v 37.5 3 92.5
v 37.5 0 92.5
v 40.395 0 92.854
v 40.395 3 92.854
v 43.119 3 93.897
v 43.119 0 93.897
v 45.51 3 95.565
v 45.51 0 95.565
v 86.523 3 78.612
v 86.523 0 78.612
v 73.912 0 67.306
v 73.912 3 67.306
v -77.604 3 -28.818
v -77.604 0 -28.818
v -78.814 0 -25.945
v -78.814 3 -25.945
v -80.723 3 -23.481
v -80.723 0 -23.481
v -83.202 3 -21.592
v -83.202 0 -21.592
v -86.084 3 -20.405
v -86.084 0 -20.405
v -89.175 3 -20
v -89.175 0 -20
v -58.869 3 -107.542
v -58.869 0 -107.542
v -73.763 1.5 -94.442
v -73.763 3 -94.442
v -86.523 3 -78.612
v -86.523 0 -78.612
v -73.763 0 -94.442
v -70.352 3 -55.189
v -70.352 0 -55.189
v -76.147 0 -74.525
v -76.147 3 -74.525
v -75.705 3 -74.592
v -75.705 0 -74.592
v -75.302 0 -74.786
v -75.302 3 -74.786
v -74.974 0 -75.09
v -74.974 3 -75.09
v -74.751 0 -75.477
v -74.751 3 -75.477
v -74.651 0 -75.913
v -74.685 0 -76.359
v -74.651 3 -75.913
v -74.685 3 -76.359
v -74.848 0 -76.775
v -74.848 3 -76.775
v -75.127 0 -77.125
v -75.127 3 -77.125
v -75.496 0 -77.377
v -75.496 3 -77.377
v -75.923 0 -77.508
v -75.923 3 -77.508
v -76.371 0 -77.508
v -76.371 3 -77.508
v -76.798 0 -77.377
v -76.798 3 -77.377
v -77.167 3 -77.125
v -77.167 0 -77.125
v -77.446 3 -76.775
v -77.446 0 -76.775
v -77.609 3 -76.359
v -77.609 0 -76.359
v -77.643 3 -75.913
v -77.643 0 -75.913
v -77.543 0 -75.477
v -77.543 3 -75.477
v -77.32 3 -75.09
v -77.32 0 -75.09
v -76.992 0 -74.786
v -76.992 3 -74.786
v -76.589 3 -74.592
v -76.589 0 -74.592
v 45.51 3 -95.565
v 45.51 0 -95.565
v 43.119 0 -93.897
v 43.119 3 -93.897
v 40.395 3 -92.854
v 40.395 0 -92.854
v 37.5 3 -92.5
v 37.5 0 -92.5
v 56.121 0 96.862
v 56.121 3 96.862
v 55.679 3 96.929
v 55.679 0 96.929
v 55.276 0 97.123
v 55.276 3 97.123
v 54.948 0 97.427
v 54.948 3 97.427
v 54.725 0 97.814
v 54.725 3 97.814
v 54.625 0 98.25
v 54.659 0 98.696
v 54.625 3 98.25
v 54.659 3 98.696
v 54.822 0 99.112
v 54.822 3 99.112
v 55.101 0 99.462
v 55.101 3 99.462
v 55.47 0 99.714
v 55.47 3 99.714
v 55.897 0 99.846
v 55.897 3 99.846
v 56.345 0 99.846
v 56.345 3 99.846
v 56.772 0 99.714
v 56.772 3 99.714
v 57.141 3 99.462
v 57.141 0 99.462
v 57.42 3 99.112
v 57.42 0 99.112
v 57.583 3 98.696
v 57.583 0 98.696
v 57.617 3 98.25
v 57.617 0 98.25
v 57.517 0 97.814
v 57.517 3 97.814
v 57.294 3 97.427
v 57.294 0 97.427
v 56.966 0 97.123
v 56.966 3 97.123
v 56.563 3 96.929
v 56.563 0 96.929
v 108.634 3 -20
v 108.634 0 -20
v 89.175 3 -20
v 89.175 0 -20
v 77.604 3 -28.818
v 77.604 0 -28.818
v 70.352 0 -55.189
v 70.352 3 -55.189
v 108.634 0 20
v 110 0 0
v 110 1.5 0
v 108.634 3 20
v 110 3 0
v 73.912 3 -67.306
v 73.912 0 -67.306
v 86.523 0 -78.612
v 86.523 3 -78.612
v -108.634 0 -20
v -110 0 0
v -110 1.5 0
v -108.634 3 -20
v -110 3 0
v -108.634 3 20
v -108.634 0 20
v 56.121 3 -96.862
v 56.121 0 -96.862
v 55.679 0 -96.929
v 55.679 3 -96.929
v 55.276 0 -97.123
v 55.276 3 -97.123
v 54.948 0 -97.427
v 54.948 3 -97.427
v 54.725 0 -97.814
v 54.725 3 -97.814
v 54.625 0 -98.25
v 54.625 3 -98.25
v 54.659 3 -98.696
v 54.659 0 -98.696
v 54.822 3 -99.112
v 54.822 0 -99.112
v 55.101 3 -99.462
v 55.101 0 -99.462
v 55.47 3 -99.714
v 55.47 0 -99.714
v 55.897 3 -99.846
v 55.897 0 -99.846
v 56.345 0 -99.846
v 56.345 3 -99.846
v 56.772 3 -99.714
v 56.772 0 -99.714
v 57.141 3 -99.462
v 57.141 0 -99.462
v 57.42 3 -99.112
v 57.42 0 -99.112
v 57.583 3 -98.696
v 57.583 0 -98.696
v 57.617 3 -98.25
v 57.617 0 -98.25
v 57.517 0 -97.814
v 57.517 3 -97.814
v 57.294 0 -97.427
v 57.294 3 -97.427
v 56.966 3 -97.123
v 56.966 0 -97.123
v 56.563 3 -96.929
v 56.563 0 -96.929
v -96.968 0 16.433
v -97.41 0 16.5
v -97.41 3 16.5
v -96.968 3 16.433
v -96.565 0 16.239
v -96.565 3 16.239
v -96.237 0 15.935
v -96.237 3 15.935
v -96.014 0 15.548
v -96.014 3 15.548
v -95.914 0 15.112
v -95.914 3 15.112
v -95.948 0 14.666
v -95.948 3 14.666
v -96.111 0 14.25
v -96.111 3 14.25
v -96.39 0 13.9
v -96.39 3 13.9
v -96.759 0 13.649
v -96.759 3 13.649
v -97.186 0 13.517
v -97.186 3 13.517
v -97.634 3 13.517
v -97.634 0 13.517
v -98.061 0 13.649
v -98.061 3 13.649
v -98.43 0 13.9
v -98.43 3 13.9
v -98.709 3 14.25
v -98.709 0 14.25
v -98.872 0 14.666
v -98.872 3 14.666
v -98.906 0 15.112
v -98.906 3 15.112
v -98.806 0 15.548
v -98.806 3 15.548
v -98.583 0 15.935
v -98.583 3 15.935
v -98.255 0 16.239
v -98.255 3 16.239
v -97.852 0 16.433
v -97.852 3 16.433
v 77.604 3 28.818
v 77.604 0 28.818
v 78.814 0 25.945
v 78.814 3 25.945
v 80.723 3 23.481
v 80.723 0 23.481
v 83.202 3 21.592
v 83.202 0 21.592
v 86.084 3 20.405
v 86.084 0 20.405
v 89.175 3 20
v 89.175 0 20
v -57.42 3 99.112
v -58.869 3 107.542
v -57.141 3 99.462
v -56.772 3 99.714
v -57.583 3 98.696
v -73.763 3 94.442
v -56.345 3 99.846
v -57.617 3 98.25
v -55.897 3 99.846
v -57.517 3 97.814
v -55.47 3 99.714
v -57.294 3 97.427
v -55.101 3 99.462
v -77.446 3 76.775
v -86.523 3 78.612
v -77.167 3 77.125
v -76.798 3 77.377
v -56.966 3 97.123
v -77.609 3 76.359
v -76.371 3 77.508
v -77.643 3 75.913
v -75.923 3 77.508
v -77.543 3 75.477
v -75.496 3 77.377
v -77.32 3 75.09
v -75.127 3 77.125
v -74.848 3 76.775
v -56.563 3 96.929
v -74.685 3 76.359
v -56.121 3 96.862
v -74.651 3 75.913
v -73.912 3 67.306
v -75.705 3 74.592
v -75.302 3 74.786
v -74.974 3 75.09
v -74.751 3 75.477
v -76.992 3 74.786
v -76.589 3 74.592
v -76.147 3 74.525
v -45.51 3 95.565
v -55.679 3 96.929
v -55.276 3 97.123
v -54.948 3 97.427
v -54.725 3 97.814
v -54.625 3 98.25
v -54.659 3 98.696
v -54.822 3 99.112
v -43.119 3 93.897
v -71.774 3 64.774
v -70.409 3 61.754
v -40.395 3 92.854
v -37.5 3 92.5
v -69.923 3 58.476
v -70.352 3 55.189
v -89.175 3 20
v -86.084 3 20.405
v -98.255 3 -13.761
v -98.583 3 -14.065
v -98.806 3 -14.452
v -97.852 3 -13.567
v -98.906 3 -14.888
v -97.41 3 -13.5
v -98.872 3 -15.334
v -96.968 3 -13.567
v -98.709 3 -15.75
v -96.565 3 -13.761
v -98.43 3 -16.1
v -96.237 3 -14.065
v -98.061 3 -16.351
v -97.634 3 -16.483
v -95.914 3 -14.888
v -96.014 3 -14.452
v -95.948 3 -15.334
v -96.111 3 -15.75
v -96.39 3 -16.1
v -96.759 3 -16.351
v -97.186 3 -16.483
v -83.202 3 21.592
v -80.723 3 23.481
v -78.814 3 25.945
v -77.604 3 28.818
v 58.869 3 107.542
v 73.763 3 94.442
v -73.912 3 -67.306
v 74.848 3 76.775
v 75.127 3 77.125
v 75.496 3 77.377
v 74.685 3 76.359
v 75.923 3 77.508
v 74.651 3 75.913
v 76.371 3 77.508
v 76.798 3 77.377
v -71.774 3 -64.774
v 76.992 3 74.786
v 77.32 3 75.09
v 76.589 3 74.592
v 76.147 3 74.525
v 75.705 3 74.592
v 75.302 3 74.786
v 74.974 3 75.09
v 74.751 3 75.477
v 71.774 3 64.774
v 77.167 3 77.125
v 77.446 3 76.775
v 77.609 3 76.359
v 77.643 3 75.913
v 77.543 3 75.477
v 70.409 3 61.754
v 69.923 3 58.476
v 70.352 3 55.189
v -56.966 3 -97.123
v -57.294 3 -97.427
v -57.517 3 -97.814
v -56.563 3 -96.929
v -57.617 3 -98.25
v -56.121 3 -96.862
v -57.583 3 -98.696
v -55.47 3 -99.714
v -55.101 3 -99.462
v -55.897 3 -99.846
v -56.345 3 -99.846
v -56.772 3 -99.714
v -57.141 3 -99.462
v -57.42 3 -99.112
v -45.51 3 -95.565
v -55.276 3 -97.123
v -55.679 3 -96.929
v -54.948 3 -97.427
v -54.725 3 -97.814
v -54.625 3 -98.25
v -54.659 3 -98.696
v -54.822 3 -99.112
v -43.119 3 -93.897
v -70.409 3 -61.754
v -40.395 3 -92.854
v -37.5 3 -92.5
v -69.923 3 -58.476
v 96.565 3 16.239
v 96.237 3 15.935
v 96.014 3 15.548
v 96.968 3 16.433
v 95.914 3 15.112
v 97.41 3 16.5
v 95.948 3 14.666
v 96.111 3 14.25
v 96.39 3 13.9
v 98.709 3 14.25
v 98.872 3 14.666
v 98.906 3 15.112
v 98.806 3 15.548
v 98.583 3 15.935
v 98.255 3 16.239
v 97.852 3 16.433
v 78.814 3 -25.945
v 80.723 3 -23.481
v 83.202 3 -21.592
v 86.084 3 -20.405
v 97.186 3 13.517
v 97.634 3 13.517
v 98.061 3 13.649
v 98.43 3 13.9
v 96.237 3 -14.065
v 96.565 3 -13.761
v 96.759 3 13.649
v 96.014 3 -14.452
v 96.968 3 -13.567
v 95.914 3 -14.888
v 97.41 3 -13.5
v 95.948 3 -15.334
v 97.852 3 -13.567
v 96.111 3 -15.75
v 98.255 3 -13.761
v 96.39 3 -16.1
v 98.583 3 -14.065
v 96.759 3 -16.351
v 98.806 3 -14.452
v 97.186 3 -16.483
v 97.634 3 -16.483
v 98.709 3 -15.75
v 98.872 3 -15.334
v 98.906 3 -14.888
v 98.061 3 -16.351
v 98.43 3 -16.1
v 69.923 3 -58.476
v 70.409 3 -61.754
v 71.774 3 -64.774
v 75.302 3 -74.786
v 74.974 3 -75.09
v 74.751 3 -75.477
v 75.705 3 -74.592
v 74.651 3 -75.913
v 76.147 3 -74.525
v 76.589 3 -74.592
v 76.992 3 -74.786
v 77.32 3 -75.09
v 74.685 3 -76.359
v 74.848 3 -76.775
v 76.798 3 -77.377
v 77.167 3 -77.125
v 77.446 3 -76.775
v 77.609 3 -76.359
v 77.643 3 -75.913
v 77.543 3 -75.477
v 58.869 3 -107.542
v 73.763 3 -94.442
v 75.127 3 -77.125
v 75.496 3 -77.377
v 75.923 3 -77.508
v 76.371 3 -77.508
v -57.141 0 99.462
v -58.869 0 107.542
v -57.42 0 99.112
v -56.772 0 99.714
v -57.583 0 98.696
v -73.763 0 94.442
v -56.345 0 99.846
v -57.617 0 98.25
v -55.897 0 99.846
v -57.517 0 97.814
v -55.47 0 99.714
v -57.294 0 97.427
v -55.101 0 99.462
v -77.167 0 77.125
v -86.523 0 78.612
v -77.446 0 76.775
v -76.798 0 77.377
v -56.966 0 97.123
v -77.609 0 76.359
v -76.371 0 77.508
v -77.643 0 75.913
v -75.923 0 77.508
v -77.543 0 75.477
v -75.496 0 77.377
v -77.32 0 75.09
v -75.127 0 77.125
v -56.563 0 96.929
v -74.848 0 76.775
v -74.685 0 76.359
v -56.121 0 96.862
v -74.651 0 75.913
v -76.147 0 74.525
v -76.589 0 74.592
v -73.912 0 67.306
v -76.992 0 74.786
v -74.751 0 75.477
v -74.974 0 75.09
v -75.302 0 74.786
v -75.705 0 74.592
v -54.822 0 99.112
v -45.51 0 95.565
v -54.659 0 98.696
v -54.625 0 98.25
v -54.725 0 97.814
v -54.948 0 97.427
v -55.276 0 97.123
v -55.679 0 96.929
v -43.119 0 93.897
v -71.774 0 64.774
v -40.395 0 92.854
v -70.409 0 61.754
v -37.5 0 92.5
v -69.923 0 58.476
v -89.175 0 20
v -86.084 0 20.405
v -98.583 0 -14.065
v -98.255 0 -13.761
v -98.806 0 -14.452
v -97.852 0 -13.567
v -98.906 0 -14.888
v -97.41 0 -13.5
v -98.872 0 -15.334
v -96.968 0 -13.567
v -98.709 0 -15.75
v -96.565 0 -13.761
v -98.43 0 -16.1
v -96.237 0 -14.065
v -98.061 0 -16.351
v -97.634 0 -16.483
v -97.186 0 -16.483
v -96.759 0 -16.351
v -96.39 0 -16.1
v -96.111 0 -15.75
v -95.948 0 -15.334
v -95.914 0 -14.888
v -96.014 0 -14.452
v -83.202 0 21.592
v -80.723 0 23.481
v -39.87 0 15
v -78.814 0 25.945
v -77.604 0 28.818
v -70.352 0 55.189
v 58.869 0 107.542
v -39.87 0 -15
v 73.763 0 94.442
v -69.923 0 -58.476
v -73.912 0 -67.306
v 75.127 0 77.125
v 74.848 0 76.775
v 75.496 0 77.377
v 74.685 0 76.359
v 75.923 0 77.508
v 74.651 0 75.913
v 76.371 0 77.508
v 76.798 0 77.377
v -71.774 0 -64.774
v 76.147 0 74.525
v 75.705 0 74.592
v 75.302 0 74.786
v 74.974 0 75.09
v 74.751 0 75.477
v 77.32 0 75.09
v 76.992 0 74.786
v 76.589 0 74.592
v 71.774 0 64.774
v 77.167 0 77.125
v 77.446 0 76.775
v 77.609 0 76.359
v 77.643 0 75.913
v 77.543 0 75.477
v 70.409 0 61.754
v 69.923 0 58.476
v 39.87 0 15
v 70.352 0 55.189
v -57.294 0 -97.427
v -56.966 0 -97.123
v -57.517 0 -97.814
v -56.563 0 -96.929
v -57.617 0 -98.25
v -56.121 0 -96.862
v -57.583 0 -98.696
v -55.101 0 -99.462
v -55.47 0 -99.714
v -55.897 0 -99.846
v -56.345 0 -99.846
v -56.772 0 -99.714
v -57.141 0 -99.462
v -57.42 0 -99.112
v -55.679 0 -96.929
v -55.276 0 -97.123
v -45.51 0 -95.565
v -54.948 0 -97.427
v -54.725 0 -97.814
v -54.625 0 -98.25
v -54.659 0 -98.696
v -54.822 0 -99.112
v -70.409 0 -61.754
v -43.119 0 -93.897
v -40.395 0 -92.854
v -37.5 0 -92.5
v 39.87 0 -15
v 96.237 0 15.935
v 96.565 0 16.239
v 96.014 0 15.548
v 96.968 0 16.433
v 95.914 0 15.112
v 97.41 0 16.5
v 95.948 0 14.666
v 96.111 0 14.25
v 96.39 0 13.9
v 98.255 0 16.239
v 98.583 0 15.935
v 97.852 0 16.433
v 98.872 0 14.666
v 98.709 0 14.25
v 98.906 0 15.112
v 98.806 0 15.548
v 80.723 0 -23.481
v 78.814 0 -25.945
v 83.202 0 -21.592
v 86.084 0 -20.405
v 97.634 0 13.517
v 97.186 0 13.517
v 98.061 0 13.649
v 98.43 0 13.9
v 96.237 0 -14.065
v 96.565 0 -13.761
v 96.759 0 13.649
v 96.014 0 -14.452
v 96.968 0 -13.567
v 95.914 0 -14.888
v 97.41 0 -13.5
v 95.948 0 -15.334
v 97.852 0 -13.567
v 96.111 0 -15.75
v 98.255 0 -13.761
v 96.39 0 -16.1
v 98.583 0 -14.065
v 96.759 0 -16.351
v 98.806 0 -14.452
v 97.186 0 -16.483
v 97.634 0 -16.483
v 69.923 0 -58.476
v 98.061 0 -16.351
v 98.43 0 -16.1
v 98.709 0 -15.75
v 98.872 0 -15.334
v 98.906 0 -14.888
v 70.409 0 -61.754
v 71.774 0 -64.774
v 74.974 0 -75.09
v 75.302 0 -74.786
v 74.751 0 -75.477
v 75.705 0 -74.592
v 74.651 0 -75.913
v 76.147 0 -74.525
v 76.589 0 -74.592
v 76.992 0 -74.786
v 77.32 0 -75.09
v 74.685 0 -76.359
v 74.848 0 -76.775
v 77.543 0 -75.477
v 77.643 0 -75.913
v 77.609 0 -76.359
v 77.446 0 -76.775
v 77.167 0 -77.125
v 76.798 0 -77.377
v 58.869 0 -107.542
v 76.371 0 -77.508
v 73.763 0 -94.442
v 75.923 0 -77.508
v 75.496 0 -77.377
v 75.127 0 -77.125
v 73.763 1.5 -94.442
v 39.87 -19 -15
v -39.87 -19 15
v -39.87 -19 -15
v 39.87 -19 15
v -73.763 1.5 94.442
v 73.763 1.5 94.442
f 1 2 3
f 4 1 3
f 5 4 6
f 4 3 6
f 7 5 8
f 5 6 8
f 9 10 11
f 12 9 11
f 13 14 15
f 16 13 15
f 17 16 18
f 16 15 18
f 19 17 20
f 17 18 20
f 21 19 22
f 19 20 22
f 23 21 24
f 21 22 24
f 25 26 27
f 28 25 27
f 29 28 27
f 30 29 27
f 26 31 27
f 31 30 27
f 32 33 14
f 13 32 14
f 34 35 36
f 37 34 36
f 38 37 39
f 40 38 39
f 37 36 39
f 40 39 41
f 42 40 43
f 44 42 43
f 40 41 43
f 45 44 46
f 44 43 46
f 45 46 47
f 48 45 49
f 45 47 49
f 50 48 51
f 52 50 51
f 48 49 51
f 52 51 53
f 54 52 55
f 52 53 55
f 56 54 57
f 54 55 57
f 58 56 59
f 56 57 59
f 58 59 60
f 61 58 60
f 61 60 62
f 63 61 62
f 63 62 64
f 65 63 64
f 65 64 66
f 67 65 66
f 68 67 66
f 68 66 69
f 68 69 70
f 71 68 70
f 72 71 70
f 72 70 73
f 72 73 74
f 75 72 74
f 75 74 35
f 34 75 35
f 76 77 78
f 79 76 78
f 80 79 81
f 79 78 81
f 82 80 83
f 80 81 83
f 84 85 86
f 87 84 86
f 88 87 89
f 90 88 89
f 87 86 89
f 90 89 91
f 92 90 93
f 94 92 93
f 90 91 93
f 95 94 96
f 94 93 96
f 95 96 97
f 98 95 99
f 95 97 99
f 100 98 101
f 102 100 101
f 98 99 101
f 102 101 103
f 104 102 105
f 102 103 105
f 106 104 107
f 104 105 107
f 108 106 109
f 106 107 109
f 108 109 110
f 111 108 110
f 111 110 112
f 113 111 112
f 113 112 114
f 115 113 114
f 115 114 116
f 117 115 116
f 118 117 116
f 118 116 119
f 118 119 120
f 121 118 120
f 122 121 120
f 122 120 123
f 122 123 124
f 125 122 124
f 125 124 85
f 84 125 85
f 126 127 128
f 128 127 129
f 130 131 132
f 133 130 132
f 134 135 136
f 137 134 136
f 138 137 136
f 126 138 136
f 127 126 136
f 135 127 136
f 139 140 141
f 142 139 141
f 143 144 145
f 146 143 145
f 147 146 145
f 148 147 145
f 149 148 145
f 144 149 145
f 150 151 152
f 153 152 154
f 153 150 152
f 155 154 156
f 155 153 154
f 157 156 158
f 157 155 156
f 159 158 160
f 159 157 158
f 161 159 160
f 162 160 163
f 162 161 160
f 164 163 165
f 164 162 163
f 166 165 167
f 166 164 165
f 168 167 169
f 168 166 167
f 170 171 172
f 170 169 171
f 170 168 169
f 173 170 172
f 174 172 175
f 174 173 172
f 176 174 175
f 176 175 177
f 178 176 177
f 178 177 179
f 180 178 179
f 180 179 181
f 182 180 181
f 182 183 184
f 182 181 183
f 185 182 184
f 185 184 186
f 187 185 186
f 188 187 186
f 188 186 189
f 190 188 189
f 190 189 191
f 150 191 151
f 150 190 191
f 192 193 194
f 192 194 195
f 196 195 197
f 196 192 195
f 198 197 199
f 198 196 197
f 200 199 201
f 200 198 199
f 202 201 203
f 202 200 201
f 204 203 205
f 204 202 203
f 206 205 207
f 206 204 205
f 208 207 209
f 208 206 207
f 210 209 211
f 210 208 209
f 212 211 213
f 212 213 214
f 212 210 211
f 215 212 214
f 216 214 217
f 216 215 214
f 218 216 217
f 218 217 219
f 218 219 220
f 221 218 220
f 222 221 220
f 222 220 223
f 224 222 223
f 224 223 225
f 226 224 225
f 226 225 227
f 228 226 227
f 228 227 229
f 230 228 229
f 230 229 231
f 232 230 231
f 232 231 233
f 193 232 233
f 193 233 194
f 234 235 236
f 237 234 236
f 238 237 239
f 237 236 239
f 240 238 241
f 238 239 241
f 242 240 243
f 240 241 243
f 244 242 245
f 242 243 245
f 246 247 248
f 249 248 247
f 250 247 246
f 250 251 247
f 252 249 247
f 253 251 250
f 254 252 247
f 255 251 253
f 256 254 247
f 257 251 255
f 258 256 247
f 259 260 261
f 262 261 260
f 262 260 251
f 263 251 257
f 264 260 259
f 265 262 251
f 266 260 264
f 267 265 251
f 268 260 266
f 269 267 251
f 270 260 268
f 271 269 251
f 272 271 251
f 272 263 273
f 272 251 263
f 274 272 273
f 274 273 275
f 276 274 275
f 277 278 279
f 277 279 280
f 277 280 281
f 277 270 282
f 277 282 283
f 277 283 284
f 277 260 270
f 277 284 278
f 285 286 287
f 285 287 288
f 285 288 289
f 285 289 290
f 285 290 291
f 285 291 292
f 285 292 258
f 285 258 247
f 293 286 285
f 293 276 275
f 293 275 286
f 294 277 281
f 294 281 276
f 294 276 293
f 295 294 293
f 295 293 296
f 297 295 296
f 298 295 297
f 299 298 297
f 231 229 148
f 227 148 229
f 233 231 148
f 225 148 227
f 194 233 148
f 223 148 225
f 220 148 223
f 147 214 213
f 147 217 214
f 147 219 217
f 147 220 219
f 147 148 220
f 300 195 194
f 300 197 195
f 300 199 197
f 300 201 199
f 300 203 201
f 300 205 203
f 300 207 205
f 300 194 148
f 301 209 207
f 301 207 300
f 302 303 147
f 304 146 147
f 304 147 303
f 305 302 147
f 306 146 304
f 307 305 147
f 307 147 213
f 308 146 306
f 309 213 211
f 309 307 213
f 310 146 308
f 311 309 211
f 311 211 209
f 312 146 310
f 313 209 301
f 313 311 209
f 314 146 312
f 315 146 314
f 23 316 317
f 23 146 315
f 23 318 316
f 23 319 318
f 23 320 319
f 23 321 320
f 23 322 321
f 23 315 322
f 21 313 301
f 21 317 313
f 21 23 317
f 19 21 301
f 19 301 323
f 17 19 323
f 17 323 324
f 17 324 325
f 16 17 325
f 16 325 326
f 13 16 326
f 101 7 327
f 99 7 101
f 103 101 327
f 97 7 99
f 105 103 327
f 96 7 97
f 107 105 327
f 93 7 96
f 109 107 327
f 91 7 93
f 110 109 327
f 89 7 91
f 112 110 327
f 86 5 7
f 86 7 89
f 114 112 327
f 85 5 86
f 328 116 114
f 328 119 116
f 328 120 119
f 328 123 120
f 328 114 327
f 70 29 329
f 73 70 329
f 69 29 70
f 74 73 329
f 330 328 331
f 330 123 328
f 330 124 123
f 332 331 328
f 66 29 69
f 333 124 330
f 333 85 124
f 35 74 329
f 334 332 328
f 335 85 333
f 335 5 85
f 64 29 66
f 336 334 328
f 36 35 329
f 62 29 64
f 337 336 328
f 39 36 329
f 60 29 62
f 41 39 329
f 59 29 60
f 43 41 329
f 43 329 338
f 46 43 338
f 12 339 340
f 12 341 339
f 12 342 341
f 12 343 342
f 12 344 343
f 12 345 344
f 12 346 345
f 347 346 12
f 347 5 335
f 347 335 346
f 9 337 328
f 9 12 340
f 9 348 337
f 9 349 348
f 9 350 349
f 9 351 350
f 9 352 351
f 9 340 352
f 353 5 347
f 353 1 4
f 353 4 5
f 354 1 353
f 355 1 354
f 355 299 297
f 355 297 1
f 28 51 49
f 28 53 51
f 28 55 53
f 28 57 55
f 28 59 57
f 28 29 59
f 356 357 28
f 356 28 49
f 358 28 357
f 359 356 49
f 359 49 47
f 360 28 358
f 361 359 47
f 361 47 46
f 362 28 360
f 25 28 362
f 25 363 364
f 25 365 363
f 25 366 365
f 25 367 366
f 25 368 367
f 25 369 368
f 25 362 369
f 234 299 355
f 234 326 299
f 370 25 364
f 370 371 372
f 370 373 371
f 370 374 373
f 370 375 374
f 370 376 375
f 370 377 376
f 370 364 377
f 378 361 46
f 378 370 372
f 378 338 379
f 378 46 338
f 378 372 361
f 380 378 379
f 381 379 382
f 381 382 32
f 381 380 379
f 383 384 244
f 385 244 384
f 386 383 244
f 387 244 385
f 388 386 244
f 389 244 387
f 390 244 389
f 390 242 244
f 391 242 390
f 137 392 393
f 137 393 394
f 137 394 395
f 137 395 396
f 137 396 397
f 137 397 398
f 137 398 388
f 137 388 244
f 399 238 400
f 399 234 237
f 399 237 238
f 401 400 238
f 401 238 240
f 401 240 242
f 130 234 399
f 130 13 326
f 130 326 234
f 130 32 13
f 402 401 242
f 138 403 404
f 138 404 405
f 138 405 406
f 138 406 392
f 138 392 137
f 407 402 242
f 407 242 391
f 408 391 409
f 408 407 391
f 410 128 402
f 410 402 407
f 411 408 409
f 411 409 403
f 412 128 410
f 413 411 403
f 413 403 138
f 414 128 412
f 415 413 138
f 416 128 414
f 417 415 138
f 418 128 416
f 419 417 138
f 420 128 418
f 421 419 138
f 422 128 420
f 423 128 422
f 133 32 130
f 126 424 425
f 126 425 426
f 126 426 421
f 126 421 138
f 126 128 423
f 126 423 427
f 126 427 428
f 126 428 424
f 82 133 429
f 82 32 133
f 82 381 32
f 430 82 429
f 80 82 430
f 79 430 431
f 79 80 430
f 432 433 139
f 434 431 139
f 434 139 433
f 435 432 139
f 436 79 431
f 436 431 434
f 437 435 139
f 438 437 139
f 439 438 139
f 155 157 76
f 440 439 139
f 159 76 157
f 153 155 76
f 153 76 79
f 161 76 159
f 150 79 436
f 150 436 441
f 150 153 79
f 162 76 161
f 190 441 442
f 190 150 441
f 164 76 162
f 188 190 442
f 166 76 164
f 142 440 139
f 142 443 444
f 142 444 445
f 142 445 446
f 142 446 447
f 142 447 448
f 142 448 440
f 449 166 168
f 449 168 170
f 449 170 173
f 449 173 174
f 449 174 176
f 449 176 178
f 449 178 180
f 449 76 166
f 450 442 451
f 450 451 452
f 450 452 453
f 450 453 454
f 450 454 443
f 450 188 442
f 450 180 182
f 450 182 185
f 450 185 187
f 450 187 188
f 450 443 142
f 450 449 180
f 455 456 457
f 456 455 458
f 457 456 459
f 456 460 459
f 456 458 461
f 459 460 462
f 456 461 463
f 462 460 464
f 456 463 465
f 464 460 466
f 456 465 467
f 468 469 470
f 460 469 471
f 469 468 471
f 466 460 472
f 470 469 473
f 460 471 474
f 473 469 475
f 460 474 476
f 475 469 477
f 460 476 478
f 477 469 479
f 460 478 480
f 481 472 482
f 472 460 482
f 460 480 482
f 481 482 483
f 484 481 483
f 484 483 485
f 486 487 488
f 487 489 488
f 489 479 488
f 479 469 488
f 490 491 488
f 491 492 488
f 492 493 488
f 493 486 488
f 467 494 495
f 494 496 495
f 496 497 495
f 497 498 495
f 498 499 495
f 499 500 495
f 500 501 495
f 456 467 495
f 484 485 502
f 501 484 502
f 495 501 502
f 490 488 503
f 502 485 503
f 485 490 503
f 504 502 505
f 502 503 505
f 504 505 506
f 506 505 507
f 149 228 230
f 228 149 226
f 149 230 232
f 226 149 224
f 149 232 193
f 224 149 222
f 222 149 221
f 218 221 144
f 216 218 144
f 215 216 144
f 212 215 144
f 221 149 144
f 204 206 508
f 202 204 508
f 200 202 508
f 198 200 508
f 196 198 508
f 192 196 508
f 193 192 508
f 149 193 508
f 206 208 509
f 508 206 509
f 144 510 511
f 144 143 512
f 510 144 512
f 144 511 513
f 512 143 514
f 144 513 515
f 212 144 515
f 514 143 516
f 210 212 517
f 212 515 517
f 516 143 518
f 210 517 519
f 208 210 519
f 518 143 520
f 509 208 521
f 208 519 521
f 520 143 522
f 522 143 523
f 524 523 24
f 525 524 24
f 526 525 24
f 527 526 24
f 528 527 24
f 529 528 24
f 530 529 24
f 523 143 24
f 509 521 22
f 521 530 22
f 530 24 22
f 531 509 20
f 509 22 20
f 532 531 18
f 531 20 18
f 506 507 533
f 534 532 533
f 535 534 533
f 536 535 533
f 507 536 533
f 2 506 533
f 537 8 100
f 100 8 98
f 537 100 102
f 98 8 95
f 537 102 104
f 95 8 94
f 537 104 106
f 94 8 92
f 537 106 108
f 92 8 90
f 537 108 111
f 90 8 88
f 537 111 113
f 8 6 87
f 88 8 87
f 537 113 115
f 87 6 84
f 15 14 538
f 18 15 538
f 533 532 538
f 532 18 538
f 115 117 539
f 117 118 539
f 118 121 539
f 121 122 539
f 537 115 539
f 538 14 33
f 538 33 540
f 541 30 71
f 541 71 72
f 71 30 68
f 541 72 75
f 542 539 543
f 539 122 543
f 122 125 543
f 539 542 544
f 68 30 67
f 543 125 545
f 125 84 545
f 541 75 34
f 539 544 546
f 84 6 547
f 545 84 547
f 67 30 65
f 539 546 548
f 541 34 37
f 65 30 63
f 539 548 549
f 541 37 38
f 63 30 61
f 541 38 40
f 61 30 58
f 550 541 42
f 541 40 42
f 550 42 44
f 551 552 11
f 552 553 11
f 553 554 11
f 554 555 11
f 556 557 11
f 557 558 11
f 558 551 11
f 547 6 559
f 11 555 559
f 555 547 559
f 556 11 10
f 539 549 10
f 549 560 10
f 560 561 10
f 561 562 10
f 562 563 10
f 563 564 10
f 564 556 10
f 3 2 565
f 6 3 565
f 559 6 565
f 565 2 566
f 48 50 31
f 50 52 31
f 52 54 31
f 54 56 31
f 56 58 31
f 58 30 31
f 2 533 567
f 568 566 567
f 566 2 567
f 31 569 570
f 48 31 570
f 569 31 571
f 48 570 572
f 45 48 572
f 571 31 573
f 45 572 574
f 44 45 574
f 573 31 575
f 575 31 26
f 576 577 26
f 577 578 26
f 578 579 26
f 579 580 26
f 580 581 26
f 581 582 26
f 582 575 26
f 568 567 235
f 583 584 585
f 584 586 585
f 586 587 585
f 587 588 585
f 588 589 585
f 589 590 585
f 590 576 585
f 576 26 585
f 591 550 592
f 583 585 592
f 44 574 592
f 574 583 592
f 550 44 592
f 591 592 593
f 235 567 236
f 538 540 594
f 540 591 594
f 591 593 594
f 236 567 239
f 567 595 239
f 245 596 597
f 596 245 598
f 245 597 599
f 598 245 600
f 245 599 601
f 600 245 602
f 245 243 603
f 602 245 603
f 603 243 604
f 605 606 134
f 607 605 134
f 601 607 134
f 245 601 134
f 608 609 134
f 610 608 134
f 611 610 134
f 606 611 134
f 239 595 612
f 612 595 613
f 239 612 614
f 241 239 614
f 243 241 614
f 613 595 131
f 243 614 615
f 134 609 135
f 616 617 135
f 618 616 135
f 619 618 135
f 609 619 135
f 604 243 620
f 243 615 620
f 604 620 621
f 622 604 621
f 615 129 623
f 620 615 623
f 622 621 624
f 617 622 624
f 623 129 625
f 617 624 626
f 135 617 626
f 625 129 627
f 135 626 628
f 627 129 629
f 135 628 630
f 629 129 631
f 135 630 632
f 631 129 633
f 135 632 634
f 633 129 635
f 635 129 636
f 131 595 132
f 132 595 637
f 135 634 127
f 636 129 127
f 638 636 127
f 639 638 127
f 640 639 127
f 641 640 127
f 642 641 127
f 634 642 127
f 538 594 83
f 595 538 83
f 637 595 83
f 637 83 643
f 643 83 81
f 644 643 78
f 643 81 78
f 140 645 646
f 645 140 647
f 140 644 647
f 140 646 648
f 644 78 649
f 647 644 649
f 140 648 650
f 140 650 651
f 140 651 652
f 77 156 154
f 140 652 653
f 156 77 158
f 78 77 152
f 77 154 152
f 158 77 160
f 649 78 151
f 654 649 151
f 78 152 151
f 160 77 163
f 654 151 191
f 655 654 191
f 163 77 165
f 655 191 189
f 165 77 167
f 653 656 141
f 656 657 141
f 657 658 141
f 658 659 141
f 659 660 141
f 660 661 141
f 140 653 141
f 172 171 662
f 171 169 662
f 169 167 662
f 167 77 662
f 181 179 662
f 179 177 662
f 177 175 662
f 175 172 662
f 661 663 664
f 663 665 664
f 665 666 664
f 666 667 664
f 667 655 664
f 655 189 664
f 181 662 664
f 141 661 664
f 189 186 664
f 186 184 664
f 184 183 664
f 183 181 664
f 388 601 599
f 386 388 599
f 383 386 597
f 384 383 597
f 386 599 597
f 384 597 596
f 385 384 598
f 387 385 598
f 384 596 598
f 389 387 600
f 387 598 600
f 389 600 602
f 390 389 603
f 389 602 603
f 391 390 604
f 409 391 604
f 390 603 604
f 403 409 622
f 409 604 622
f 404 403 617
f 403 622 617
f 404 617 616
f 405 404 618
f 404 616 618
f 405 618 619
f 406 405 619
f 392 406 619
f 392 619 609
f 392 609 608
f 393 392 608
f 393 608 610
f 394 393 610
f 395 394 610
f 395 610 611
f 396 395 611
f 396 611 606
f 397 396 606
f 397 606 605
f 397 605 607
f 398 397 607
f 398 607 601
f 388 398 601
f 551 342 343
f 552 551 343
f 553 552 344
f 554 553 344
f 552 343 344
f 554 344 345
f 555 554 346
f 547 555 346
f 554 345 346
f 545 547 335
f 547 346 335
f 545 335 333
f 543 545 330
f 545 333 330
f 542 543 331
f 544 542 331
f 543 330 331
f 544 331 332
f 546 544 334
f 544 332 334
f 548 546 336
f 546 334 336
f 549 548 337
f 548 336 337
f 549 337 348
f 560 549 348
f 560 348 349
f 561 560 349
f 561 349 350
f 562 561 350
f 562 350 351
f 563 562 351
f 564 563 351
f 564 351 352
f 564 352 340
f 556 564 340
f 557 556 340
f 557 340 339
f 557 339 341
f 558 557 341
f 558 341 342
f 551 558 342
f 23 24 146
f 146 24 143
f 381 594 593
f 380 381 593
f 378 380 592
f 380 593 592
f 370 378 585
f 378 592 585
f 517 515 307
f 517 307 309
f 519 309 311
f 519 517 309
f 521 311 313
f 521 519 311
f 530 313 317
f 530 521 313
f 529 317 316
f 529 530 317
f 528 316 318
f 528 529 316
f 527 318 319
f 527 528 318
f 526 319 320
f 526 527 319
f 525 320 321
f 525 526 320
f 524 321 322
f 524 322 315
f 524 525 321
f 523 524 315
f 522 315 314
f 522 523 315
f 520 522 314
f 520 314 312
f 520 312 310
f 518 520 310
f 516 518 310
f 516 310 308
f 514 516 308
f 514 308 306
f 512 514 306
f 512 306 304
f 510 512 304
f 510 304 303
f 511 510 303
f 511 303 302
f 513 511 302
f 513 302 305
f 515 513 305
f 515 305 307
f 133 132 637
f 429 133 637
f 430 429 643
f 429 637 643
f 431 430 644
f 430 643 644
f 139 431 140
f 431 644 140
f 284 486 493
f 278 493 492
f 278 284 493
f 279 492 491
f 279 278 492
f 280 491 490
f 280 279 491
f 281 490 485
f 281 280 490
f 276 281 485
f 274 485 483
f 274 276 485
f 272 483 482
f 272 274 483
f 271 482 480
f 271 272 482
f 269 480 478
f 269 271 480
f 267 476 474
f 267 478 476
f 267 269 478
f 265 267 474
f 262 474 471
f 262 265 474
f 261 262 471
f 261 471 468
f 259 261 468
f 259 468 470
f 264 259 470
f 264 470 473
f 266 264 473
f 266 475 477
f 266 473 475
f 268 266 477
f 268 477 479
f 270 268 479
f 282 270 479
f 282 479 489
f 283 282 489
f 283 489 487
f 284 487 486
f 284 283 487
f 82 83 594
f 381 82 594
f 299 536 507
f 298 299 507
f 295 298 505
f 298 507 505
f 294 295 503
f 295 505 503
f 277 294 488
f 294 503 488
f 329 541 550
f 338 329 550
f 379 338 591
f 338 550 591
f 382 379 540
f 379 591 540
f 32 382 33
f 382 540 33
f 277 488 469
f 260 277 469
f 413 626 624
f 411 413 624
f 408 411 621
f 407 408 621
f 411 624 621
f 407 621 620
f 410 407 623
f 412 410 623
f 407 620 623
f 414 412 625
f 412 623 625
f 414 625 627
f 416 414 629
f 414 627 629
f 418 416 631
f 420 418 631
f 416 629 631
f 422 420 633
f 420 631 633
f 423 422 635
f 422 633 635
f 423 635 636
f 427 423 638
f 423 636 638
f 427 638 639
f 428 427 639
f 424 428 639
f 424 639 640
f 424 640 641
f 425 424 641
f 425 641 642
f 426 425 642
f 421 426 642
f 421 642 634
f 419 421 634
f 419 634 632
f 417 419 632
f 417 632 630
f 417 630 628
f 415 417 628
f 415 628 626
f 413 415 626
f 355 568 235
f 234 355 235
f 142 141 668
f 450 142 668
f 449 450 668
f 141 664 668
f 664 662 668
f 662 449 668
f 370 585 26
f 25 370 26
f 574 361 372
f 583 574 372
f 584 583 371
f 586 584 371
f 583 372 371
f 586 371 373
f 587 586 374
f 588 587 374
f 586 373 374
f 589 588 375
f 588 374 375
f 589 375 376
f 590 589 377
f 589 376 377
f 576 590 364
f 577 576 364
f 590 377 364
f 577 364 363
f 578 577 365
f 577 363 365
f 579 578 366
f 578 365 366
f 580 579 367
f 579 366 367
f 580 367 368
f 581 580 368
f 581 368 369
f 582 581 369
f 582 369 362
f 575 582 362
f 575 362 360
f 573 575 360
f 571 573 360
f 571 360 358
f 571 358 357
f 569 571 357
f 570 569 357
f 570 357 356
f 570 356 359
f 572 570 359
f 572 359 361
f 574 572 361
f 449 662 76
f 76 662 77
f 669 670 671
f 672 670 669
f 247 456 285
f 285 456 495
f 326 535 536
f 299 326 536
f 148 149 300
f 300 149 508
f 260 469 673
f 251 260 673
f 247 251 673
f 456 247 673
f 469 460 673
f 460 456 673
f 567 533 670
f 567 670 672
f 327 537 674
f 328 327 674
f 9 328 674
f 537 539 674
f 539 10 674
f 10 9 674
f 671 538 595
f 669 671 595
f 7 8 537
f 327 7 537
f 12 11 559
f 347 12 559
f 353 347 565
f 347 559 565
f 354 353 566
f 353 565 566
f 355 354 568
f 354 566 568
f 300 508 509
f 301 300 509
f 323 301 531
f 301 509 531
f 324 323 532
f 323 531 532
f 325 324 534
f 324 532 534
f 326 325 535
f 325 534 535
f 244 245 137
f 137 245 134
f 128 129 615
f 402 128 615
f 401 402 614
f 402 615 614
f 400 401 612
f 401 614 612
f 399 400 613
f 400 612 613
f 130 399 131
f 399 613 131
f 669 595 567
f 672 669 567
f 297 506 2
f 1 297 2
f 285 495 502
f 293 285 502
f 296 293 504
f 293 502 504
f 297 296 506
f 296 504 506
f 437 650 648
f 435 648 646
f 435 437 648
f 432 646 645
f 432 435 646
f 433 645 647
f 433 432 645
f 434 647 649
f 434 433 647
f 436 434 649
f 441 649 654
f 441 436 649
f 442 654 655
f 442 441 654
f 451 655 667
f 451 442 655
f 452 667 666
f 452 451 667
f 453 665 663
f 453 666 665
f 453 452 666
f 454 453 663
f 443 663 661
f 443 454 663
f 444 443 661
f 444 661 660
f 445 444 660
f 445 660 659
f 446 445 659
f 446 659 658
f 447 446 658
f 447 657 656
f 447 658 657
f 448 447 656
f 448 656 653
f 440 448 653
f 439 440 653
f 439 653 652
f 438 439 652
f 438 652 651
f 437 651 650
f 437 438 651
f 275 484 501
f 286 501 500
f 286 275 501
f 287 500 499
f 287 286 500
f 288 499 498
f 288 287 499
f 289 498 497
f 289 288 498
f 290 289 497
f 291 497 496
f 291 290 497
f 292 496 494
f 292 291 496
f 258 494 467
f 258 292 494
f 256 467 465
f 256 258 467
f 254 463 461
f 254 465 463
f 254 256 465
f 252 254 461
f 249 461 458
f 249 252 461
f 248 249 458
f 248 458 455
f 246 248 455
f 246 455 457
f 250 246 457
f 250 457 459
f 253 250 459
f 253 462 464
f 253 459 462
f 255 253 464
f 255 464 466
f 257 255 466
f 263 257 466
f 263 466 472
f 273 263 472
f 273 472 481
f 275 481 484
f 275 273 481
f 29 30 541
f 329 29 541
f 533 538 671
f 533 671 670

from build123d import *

# Parameters (mm, degrees)
SKETCH2_R               = 1.5
BOSS_EXTRUDE1_DEPTH     = 3
SKETCH7_R               = 1.5
CUT_EXTRUDE4_DEPTH      = 10
MIRROR2_COPY_1_SKETCH_R = 1.5
MIRROR2_COPY_1_DEPTH    = 10
CUT_EXTRUDE5_START      = -10
SKETCH8_R               = 1.5
CUT_EXTRUDE5_DEPTH      = 10
CUT_EXTRUDE6_START      = -3
CUT_EXTRUDE6_OUTLINE_R  = 1.5
CUT_EXTRUDE6_DEPTH      = 3
SKETCH10_W              = 79.739042834
SKETCH10_H              = 30
BOSS_EXTRUDE2_DEPTH     = 19


# Read off the part's stored shape, not the designer's step: Cut-Extrude6
with BuildPart() as part:
    # Sketch2 → Boss-Extrude1 (new body)
    with BuildSketch(Plane(origin=(0, 0, 0), x_dir=(1, 0, 0), z_dir=(0, 1, 0))):
        with BuildLine():
            Line((77.604131862, 28.818122204), (70.352023373, 55.1894258))
            ThreePointArc((70.352023373, 55.1894258), (70.409142384, 61.75403485), (73.912058214, 67.306235788))
            Line((73.912058214, 67.306235788), (89.448492578, 81.235106792))
            ThreePointArc((89.448492578, 81.235106792), (90.603066053, 81.737789877), (91.829194878, 81.450843369))
            ThreePointArc((91.829194878, 81.450843369), (98.283456403, 82.511045735), (98.166159929, 89.050752337))
            Line((98.166159929, 89.050752337), (71.464727022, 118.833859641))
            ThreePointArc((71.464727022, 118.833859641), (64.976597411, 119.661926694), (63.220516764, 113.361315481))
            ThreePointArc((63.220516764, 113.361315481), (63.372367291, 112.111246838), (62.747059671, 111.018214097))
            Line((62.747059671, 111.018214097), (45.510429872, 95.565067809))
            ThreePointArc((45.510429872, 95.565067809), (41.788403765, 93.292431435), (37.5, 92.5))
            Line((37.5, 92.5), (-37.5, 92.5))
            ThreePointArc((-37.5, 92.5), (-41.788403765, 93.292431435), (-45.510429872, 95.565067809))
            Line((-45.510429872, 95.565067809), (-62.747059671, 111.018214097))
            ThreePointArc((-62.747059671, 111.018214097), (-63.372367291, 112.111246838), (-63.220516764, 113.361315481))
            ThreePointArc((-63.220516764, 113.361315481), (-64.976597411, 119.661926694), (-71.464727022, 118.833859641))
            Line((-71.464727022, 118.833859641), (-98.166159929, 89.050752337))
            ThreePointArc((-98.166159929, 89.050752337), (-98.283456403, 82.511045735), (-91.829194878, 81.450843369))
            ThreePointArc((-91.829194878, 81.450843369), (-90.603066053, 81.737789877), (-89.448492578, 81.235106792))
            Line((-89.448492578, 81.235106792), (-73.912058214, 67.306235788))
            ThreePointArc((-73.912058214, 67.306235788), (-70.409142384, 61.75403485), (-70.352023373, 55.1894258))
            Line((-70.352023373, 55.1894258), (-77.604131862, 28.818122204))
            ThreePointArc((-77.604131862, 28.818122204), (-81.900757615, 22.455825506), (-89.174596575, 20))
            Line((-89.174596575, 20), (-110.791796068, 20))
            ThreePointArc((-110.791796068, 20), (-111.987024677, 20.396432549), (-112.708425763, 21.428571429))
            ThreePointArc((-112.708425763, 21.428571429), (-118.221847911, 24.947619184), (-122.5, 20))
            Line((-122.5, 20), (-122.5, -20))
            ThreePointArc((-122.5, -20), (-118.221847911, -24.947619184), (-112.708425762, -21.428571429))
            ThreePointArc((-112.708425762, -21.428571429), (-111.987024677, -20.396432549), (-110.791796067, -20))
            Line((-110.791796067, -20), (-89.174596575, -20))
            ThreePointArc((-89.174596575, -20), (-81.900757615, -22.455825506), (-77.604131862, -28.818122204))
            Line((-77.604131862, -28.818122204), (-70.352023373, -55.1894258))
            ThreePointArc((-70.352023373, -55.1894258), (-70.409142384, -61.75403485), (-73.912058214, -67.306235788))
            Line((-73.912058214, -67.306235788), (-89.448492578, -81.235106792))
            ThreePointArc((-89.448492578, -81.235106792), (-90.603066053, -81.737789877), (-91.829194878, -81.450843369))
            ThreePointArc((-91.829194878, -81.450843369), (-98.283456403, -82.511045735), (-98.166159929, -89.050752337))
            Line((-98.166159929, -89.050752337), (-71.464727022, -118.833859641))
            ThreePointArc((-71.464727022, -118.833859641), (-64.976597411, -119.661926694), (-63.220516764, -113.361315481))
            ThreePointArc((-63.220516764, -113.361315481), (-63.372367291, -112.111246838), (-62.747059671, -111.018214097))
            Line((-62.747059671, -111.018214097), (-45.510429872, -95.565067809))
            ThreePointArc((-45.510429872, -95.565067809), (-41.788403765, -93.292431435), (-37.5, -92.5))
            Line((-37.5, -92.5), (37.5, -92.5))
            ThreePointArc((37.5, -92.5), (41.788403765, -93.292431435), (45.510429872, -95.565067809))
            Line((45.510429872, -95.565067809), (62.747059671, -111.018214097))
            ThreePointArc((62.747059671, -111.018214097), (63.372367291, -112.111246838), (63.220516764, -113.361315481))
            ThreePointArc((63.220516764, -113.361315481), (64.976597411, -119.661926694), (71.464727022, -118.833859641))
            Line((71.464727022, -118.833859641), (98.166159929, -89.050752337))
            ThreePointArc((98.166159929, -89.050752337), (98.283456403, -82.511045735), (91.829194878, -81.450843369))
            ThreePointArc((91.829194878, -81.450843369), (90.603066053, -81.737789877), (89.448492578, -81.235106792))
            Line((89.448492578, -81.235106792), (73.912058214, -67.306235788))
            ThreePointArc((73.912058214, -67.306235788), (70.409142384, -61.75403485), (70.352023373, -55.1894258))
            Line((70.352023373, -55.1894258), (77.604131862, -28.818122204))
            ThreePointArc((77.604131862, -28.818122204), (81.900757615, -22.455825506), (89.174596575, -20))
            Line((89.174596575, -20), (110.791796067, -20))
            ThreePointArc((110.791796067, -20), (111.987024677, -20.396432549), (112.708425762, -21.428571429))
            ThreePointArc((112.708425762, -21.428571429), (118.221847911, -24.947619184), (122.5, -20))
            Line((122.5, -20), (122.5, 20))
            ThreePointArc((122.5, 20), (118.221847911, 24.947619184), (112.708425763, 21.428571429))
            ThreePointArc((112.708425763, 21.428571429), (111.987024677, 20.396432549), (110.791796068, 20))
            Line((110.791796068, 20), (89.174596575, 20))
            ThreePointArc((89.174596575, 20), (81.900757615, 22.455825506), (77.604131862, 28.818122204))
        make_face()
        with Locations(Location((-91.038580411, 89.375883412, 0), (0, 0, 270))):
            Circle(SKETCH2_R, mode=Mode.SUBTRACT)
        with Locations(Location((-71.012505731, 111.713213891, 0), (0, 0, 90))):
            Circle(SKETCH2_R, mode=Mode.SUBTRACT)
        with Locations(Location((91.038580411, 89.375883412, 0), (0, 0, 90))):
            Circle(SKETCH2_R, mode=Mode.SUBTRACT)
        with Locations(Location((71.012505731, 111.713213891, 0), (0, 0, 270))):
            Circle(SKETCH2_R, mode=Mode.SUBTRACT)
        with Locations(Location((91.038580411, -89.375883412, 0), (0, 0, 270))):
            Circle(SKETCH2_R, mode=Mode.SUBTRACT)
        with Locations(Location((71.012505731, -111.713213891, 0), (0, 0, 90))):
            Circle(SKETCH2_R, mode=Mode.SUBTRACT)
        with Locations(Location((-71.012505731, -111.713213891, 0), (0, 0, 270))):
            Circle(SKETCH2_R, mode=Mode.SUBTRACT)
        with Locations(Location((-91.038580411, -89.375883412, 0), (0, 0, 90))):
            Circle(SKETCH2_R, mode=Mode.SUBTRACT)
        with Locations(Location((-117.41, -15, 0), (0, 0, 270))):
            Circle(SKETCH2_R, mode=Mode.SUBTRACT)
        with Locations(Location((-117.41, 15, 0), (0, 0, 90))):
            Circle(SKETCH2_R, mode=Mode.SUBTRACT)
        with Locations(Location((117.41, -15, 0), (0, 0, 90))):
            Circle(SKETCH2_R, mode=Mode.SUBTRACT)
        with Locations(Location((117.41, 15, 0), (0, 0, 270))):
            Circle(SKETCH2_R, mode=Mode.SUBTRACT)
    extrude(amount=BOSS_EXTRUDE1_DEPTH)

    # Sketch7 → Cut-Extrude4 (cut)
    with BuildSketch(Plane(origin=(0, 3, 0), x_dir=(1, 0, 0), z_dir=(0, 1, 0))):
        with Locations(Location((-76.147026759, 76.025166959, 0), (0, 0, 270))):
            Circle(SKETCH7_R)
        with Locations(Location((-56.120952079, 98.362497437, 0), (0, 0, 270))):
            Circle(SKETCH7_R)
    cut_extrude4 = extrude(amount=-CUT_EXTRUDE4_DEPTH, mode=Mode.SUBTRACT)

    # Mirror1: Cut-Extrude4 across plane
    add(cut_extrude4.mirror(Plane(origin=(0, 0, 0), x_dir=(0, 0, 1), z_dir=(1, 0, 0))), mode=Mode.SUBTRACT)

    # Mirror2: Cut-Extrude4 across plane
    add(cut_extrude4.mirror(Plane.XY), mode=Mode.SUBTRACT)

    # Mirror2 copy 1 sketch → Mirror2 copy 1 (cut)
    with BuildSketch(Plane(origin=(0, 3, 0), x_dir=(-1, 0, 0), z_dir=(0, 1, 0))):
        with Locations(Location((-76.147026759, 76.025166959, 0), (0, 0, 270))):
            Circle(MIRROR2_COPY_1_SKETCH_R)
        with Locations(Location((-56.120952079, 98.362497437, 0), (0, 0, 270))):
            Circle(MIRROR2_COPY_1_SKETCH_R)
    extrude(amount=-MIRROR2_COPY_1_DEPTH, mode=Mode.SUBTRACT)

    # Sketch8 → Cut-Extrude5 (cut)
    with BuildSketch(Plane(origin=(0, 3, 0), x_dir=(1, 0, 0), z_dir=(0, 1, 0)).offset(CUT_EXTRUDE5_START)):
        with Locations(Location((-117.41, 15, 0), (0, 0, 90))):
            Circle(SKETCH8_R)
        with Locations(Location((-117.41, -15, 0), (0, 0, 270))):
            Circle(SKETCH8_R)
        with Locations(Location((-97.41, -15, 0), (0, 0, 270))):
            Circle(SKETCH8_R)
        with Locations(Location((-97.41, 15, 0), (0, 0, 270))):
            Circle(SKETCH8_R)
    cut_extrude5 = extrude(amount=CUT_EXTRUDE5_DEPTH, mode=Mode.SUBTRACT)

    # Mirror3: Cut-Extrude5 across plane
    add(cut_extrude5.mirror(Plane(origin=(0, 0, 0), x_dir=(0, 0, 1), z_dir=(1, 0, 0))), mode=Mode.SUBTRACT)

    # Cut-Extrude6 outline → Cut-Extrude6 (cut)
    # profile 1 of 6: a face of its own
    with BuildSketch(Plane(origin=(0, 3, 0), x_dir=(1, 0, 0), z_dir=(0, 1, 0)).offset(CUT_EXTRUDE6_START)):
        with BuildLine():
            add(Edge.make_bspline(
                [(86.522808724, 78.612145047), (74.844785146, 95.828075633), (58.86921899, 107.541615712)],
                knots=[5.377949175, 5.377949175, 5.377949175, 5.718470743, 5.718470743, 5.718470743], degree=2, weights=[1, 0.985540613, 1]))
            Line((86.522808724, 78.612145047), (89.448492578, 81.235106792))
            ThreePointArc((89.448492578, 81.235106792), (90.603066053, 81.737789877), (91.829194878, 81.450843369))
            ThreePointArc((91.829194878, 81.450843369), (98.283456403, 82.511045736), (98.166159929, 89.050752337))
            Line((98.166159929, 89.050752337), (71.464727022, 118.833859641))
            ThreePointArc((71.464727022, 118.833859641), (64.976597411, 119.661926694), (63.220516764, 113.361315481))
            ThreePointArc((63.220516764, 113.361315481), (63.372367291, 112.111246838), (62.747059671, 111.018214097))
            Line((62.747059671, 111.018214097), (58.86921899, 107.541615712))
        make_face()
        with Locations((91.038580411, 89.375883412)):
            Circle(CUT_EXTRUDE6_OUTLINE_R, mode=Mode.SUBTRACT)
        with Locations((71.012505731, 111.713213891)):
            Circle(CUT_EXTRUDE6_OUTLINE_R, mode=Mode.SUBTRACT)
    # profile 2 of 6: a face of its own
    with BuildSketch(Plane(origin=(0, 3, 0), x_dir=(1, 0, 0), z_dir=(0, 1, 0)).offset(CUT_EXTRUDE6_START)):
        with BuildLine():
            add(Edge.make_bspline(
                [(108.634090523, -20), (111.383083724, 0), (108.634090523, 20)],
                knots=[4.554635104, 4.554635104, 4.554635104, 4.870142857, 4.870142857, 4.870142857], degree=2, weights=[1, 0.987582641, 1]))
            Line((108.634090523, -20), (110.791796068, -20))
            ThreePointArc((110.791796068, -20), (111.987024677, -20.396432549), (112.708425762, -21.428571429))
            ThreePointArc((112.708425762, -21.428571429), (118.221847911, -24.947619184), (122.5, -20))
            Line((122.5, -20), (122.5, 20))
            ThreePointArc((122.5, 20), (118.221847911, 24.947619184), (112.708425763, 21.428571429))
            ThreePointArc((112.708425763, 21.428571429), (111.987024677, 20.396432549), (110.791796068, 20))
            Line((110.791796068, 20), (108.634090523, 20))
        make_face()
        with Locations((117.41, -15)):
            Circle(CUT_EXTRUDE6_OUTLINE_R, mode=Mode.SUBTRACT)
        with Locations((117.41, 15)):
            Circle(CUT_EXTRUDE6_OUTLINE_R, mode=Mode.SUBTRACT)
    # profile 3 of 6: a face of its own
    with BuildSketch(Plane(origin=(0, 3, 0), x_dir=(1, 0, 0), z_dir=(0, 1, 0)).offset(CUT_EXTRUDE6_START)):
        with BuildLine():
            add(Edge.make_bspline(
                [(58.86921899, -107.541615712), (74.844785146, -95.828075633), (86.522808724, -78.612145047)],
                knots=[3.706307217, 3.706307217, 3.706307217, 4.046828786, 4.046828786, 4.046828786], degree=2, weights=[1, 0.985540613, 1]))
            Line((58.86921899, -107.541615712), (62.747059671, -111.018214097))
            ThreePointArc((62.747059671, -111.018214097), (63.372367291, -112.111246838), (63.220516764, -113.361315481))
            ThreePointArc((63.220516764, -113.361315481), (64.976597411, -119.661926694), (71.464727022, -118.833859641))
            Line((71.464727022, -118.833859641), (98.166159929, -89.050752337))
            ThreePointArc((98.166159929, -89.050752337), (98.283456403, -82.511045736), (91.829194878, -81.450843369))
            ThreePointArc((91.829194878, -81.450843369), (90.603066053, -81.737789877), (89.448492578, -81.235106792))
            Line((89.448492578, -81.235106792), (86.522808724, -78.612145047))
        make_face()
        with Locations((71.012505731, -111.713213891)):
            Circle(CUT_EXTRUDE6_OUTLINE_R, mode=Mode.SUBTRACT)
        with Locations((91.038580411, -89.375883412)):
            Circle(CUT_EXTRUDE6_OUTLINE_R, mode=Mode.SUBTRACT)
    # profile 4 of 6: a face of its own
    with BuildSketch(Plane(origin=(0, 3, 0), x_dir=(1, 0, 0), z_dir=(0, 1, 0)).offset(CUT_EXTRUDE6_START)):
        with BuildLine():
            add(Edge.make_bspline(
                [(-86.522808724, -78.612145047), (-74.844785146, -95.828075633), (-58.86921899, -107.541615712)],
                knots=[2.236356522, 2.236356522, 2.236356522, 2.57687809, 2.57687809, 2.57687809], degree=2, weights=[1, 0.985540613, 1]))
            Line((-86.522808724, -78.612145047), (-89.448492578, -81.235106792))
            ThreePointArc((-89.448492578, -81.235106792), (-90.603066053, -81.737789877), (-91.829194878, -81.450843369))
            ThreePointArc((-91.829194878, -81.450843369), (-98.283456403, -82.511045736), (-98.166159929, -89.050752337))
            Line((-98.166159929, -89.050752337), (-71.464727022, -118.833859641))
            ThreePointArc((-71.464727022, -118.833859641), (-64.976597411, -119.661926694), (-63.220516764, -113.361315481))
            ThreePointArc((-63.220516764, -113.361315481), (-63.372367291, -112.111246838), (-62.747059671, -111.018214097))
            Line((-62.747059671, -111.018214097), (-58.86921899, -107.541615712))
        make_face()
        with Locations((-71.012505731, -111.713213891)):
            Circle(CUT_EXTRUDE6_OUTLINE_R, mode=Mode.SUBTRACT)
        with Locations((-91.038580411, -89.375883412)):
            Circle(CUT_EXTRUDE6_OUTLINE_R, mode=Mode.SUBTRACT)
    # profile 5 of 6: a face of its own
    with BuildSketch(Plane(origin=(0, 3, 0), x_dir=(1, 0, 0), z_dir=(0, 1, 0)).offset(CUT_EXTRUDE6_START)):
        with BuildLine():
            add(Edge.make_bspline(
                [(-108.634090523, 20), (-111.383083724, 0), (-108.634090523, -20)],
                knots=[1.41304245, 1.41304245, 1.41304245, 1.728550203, 1.728550203, 1.728550203], degree=2, weights=[1, 0.987582641, 1]))
            Line((-108.634090523, 20), (-110.791796068, 20))
            ThreePointArc((-110.791796068, 20), (-111.987024677, 20.396432549), (-112.708425763, 21.428571429))
            ThreePointArc((-112.708425763, 21.428571429), (-118.221847911, 24.947619184), (-122.5, 20))
            Line((-122.5, 20), (-122.5, -20))
            ThreePointArc((-122.5, -20), (-118.221847911, -24.947619184), (-112.708425762, -21.428571429))
            ThreePointArc((-112.708425762, -21.428571429), (-111.987024677, -20.396432549), (-110.791796068, -20))
            Line((-110.791796068, -20), (-108.634090523, -20))
        make_face()
        with Locations((-117.41, -15)):
            Circle(CUT_EXTRUDE6_OUTLINE_R, mode=Mode.SUBTRACT)
        with Locations((-117.41, 15)):
            Circle(CUT_EXTRUDE6_OUTLINE_R, mode=Mode.SUBTRACT)
    # profile 6 of 6: a face of its own
    with BuildSketch(Plane(origin=(0, 3, 0), x_dir=(1, 0, 0), z_dir=(0, 1, 0)).offset(CUT_EXTRUDE6_START)):
        with BuildLine():
            add(Edge.make_bspline(
                [(-58.86921899, 107.541615712), (-74.844785146, 95.828075633), (-86.522808724, 78.612145047)],
                knots=[0.564714564, 0.564714564, 0.564714564, 0.905236132, 0.905236132, 0.905236132], degree=2, weights=[1, 0.985540613, 1]))
            Line((-58.86921899, 107.541615712), (-62.747059671, 111.018214097))
            ThreePointArc((-62.747059671, 111.018214097), (-63.372367291, 112.111246838), (-63.220516764, 113.361315481))
            ThreePointArc((-63.220516764, 113.361315481), (-64.976597411, 119.661926694), (-71.464727022, 118.833859641))
            Line((-71.464727022, 118.833859641), (-98.166159929, 89.050752337))
            ThreePointArc((-98.166159929, 89.050752337), (-98.283456403, 82.511045736), (-91.829194878, 81.450843369))
            ThreePointArc((-91.829194878, 81.450843369), (-90.603066053, 81.737789877), (-89.448492578, 81.235106792))
            Line((-89.448492578, 81.235106792), (-86.522808724, 78.612145047))
        make_face()
        with Locations((-91.038580411, 89.375883412)):
            Circle(CUT_EXTRUDE6_OUTLINE_R, mode=Mode.SUBTRACT)
        with Locations((-71.012505731, 111.713213891)):
            Circle(CUT_EXTRUDE6_OUTLINE_R, mode=Mode.SUBTRACT)
    extrude(amount=CUT_EXTRUDE6_DEPTH, mode=Mode.SUBTRACT)

    # Sketch10 → Boss-Extrude2 (add)
    with BuildSketch(Plane.XZ):
        Rectangle(SKETCH10_W, SKETCH10_H)
    extrude(amount=BOSS_EXTRUDE2_DEPTH)


solid = part.part
